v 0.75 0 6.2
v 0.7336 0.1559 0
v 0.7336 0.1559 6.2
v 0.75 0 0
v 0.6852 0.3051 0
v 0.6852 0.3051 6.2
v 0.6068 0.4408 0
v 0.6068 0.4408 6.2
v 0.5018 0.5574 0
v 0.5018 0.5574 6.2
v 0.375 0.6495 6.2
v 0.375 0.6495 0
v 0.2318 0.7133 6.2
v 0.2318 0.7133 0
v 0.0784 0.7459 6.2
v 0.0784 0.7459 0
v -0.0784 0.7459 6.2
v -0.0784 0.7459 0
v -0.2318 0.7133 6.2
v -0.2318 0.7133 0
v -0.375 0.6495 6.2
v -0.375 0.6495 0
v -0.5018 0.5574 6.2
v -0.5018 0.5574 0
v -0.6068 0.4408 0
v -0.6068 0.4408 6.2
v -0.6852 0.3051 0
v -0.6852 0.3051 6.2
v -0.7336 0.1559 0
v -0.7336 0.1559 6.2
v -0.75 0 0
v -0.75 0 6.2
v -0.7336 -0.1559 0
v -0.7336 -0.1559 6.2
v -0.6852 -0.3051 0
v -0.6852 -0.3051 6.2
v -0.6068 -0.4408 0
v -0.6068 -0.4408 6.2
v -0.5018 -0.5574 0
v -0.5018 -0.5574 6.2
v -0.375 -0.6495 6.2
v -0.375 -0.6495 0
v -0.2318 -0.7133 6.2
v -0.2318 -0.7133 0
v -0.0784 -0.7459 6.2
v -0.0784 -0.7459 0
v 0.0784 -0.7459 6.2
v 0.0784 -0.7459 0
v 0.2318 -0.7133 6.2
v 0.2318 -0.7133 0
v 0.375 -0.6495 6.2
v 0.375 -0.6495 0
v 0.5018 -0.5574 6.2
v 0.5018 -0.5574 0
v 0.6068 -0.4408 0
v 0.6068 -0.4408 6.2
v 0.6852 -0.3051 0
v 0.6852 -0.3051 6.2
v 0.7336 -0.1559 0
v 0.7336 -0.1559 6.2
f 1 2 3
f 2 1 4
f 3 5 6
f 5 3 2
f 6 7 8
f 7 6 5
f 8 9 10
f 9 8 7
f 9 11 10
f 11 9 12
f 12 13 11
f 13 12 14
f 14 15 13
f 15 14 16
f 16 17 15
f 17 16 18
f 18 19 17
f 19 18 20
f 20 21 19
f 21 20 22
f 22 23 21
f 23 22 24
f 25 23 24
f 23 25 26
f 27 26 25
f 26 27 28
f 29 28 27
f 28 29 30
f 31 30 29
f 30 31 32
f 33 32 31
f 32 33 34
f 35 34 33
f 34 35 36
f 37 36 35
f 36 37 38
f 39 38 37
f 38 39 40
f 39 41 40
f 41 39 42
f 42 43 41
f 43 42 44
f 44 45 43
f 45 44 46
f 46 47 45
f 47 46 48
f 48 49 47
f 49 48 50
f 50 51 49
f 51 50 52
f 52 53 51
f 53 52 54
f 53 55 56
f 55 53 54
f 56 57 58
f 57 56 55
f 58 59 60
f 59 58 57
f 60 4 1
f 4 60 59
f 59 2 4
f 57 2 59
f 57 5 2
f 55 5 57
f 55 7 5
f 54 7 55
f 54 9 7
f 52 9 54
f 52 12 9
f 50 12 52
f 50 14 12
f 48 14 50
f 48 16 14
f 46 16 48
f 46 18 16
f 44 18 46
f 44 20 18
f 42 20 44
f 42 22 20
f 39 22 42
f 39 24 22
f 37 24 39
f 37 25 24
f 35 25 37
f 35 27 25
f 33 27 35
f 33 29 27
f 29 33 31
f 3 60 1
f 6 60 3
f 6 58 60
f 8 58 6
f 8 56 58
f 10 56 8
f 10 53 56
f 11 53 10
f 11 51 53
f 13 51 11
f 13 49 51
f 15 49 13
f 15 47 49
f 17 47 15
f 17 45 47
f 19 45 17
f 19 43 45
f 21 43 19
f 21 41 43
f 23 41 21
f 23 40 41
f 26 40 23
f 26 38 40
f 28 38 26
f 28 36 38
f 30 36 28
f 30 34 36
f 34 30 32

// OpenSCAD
// part_id: b8
// name: B8 rivet pin
// source_drawing_ids: DRW-002
// units: mm
// revision: 0.1
// SPDX-License-Identifier: MIT

module part_b8(pin_d = 1.5, pin_h = 6.2) {
    cylinder(d = pin_d, h = pin_h, center = false, $fn = 30);
}

// ---- "main guard" ----
// Default to previewing when opened directly:
if (is_undef(__LIB_MODE__)) {
    part_b8();
}
